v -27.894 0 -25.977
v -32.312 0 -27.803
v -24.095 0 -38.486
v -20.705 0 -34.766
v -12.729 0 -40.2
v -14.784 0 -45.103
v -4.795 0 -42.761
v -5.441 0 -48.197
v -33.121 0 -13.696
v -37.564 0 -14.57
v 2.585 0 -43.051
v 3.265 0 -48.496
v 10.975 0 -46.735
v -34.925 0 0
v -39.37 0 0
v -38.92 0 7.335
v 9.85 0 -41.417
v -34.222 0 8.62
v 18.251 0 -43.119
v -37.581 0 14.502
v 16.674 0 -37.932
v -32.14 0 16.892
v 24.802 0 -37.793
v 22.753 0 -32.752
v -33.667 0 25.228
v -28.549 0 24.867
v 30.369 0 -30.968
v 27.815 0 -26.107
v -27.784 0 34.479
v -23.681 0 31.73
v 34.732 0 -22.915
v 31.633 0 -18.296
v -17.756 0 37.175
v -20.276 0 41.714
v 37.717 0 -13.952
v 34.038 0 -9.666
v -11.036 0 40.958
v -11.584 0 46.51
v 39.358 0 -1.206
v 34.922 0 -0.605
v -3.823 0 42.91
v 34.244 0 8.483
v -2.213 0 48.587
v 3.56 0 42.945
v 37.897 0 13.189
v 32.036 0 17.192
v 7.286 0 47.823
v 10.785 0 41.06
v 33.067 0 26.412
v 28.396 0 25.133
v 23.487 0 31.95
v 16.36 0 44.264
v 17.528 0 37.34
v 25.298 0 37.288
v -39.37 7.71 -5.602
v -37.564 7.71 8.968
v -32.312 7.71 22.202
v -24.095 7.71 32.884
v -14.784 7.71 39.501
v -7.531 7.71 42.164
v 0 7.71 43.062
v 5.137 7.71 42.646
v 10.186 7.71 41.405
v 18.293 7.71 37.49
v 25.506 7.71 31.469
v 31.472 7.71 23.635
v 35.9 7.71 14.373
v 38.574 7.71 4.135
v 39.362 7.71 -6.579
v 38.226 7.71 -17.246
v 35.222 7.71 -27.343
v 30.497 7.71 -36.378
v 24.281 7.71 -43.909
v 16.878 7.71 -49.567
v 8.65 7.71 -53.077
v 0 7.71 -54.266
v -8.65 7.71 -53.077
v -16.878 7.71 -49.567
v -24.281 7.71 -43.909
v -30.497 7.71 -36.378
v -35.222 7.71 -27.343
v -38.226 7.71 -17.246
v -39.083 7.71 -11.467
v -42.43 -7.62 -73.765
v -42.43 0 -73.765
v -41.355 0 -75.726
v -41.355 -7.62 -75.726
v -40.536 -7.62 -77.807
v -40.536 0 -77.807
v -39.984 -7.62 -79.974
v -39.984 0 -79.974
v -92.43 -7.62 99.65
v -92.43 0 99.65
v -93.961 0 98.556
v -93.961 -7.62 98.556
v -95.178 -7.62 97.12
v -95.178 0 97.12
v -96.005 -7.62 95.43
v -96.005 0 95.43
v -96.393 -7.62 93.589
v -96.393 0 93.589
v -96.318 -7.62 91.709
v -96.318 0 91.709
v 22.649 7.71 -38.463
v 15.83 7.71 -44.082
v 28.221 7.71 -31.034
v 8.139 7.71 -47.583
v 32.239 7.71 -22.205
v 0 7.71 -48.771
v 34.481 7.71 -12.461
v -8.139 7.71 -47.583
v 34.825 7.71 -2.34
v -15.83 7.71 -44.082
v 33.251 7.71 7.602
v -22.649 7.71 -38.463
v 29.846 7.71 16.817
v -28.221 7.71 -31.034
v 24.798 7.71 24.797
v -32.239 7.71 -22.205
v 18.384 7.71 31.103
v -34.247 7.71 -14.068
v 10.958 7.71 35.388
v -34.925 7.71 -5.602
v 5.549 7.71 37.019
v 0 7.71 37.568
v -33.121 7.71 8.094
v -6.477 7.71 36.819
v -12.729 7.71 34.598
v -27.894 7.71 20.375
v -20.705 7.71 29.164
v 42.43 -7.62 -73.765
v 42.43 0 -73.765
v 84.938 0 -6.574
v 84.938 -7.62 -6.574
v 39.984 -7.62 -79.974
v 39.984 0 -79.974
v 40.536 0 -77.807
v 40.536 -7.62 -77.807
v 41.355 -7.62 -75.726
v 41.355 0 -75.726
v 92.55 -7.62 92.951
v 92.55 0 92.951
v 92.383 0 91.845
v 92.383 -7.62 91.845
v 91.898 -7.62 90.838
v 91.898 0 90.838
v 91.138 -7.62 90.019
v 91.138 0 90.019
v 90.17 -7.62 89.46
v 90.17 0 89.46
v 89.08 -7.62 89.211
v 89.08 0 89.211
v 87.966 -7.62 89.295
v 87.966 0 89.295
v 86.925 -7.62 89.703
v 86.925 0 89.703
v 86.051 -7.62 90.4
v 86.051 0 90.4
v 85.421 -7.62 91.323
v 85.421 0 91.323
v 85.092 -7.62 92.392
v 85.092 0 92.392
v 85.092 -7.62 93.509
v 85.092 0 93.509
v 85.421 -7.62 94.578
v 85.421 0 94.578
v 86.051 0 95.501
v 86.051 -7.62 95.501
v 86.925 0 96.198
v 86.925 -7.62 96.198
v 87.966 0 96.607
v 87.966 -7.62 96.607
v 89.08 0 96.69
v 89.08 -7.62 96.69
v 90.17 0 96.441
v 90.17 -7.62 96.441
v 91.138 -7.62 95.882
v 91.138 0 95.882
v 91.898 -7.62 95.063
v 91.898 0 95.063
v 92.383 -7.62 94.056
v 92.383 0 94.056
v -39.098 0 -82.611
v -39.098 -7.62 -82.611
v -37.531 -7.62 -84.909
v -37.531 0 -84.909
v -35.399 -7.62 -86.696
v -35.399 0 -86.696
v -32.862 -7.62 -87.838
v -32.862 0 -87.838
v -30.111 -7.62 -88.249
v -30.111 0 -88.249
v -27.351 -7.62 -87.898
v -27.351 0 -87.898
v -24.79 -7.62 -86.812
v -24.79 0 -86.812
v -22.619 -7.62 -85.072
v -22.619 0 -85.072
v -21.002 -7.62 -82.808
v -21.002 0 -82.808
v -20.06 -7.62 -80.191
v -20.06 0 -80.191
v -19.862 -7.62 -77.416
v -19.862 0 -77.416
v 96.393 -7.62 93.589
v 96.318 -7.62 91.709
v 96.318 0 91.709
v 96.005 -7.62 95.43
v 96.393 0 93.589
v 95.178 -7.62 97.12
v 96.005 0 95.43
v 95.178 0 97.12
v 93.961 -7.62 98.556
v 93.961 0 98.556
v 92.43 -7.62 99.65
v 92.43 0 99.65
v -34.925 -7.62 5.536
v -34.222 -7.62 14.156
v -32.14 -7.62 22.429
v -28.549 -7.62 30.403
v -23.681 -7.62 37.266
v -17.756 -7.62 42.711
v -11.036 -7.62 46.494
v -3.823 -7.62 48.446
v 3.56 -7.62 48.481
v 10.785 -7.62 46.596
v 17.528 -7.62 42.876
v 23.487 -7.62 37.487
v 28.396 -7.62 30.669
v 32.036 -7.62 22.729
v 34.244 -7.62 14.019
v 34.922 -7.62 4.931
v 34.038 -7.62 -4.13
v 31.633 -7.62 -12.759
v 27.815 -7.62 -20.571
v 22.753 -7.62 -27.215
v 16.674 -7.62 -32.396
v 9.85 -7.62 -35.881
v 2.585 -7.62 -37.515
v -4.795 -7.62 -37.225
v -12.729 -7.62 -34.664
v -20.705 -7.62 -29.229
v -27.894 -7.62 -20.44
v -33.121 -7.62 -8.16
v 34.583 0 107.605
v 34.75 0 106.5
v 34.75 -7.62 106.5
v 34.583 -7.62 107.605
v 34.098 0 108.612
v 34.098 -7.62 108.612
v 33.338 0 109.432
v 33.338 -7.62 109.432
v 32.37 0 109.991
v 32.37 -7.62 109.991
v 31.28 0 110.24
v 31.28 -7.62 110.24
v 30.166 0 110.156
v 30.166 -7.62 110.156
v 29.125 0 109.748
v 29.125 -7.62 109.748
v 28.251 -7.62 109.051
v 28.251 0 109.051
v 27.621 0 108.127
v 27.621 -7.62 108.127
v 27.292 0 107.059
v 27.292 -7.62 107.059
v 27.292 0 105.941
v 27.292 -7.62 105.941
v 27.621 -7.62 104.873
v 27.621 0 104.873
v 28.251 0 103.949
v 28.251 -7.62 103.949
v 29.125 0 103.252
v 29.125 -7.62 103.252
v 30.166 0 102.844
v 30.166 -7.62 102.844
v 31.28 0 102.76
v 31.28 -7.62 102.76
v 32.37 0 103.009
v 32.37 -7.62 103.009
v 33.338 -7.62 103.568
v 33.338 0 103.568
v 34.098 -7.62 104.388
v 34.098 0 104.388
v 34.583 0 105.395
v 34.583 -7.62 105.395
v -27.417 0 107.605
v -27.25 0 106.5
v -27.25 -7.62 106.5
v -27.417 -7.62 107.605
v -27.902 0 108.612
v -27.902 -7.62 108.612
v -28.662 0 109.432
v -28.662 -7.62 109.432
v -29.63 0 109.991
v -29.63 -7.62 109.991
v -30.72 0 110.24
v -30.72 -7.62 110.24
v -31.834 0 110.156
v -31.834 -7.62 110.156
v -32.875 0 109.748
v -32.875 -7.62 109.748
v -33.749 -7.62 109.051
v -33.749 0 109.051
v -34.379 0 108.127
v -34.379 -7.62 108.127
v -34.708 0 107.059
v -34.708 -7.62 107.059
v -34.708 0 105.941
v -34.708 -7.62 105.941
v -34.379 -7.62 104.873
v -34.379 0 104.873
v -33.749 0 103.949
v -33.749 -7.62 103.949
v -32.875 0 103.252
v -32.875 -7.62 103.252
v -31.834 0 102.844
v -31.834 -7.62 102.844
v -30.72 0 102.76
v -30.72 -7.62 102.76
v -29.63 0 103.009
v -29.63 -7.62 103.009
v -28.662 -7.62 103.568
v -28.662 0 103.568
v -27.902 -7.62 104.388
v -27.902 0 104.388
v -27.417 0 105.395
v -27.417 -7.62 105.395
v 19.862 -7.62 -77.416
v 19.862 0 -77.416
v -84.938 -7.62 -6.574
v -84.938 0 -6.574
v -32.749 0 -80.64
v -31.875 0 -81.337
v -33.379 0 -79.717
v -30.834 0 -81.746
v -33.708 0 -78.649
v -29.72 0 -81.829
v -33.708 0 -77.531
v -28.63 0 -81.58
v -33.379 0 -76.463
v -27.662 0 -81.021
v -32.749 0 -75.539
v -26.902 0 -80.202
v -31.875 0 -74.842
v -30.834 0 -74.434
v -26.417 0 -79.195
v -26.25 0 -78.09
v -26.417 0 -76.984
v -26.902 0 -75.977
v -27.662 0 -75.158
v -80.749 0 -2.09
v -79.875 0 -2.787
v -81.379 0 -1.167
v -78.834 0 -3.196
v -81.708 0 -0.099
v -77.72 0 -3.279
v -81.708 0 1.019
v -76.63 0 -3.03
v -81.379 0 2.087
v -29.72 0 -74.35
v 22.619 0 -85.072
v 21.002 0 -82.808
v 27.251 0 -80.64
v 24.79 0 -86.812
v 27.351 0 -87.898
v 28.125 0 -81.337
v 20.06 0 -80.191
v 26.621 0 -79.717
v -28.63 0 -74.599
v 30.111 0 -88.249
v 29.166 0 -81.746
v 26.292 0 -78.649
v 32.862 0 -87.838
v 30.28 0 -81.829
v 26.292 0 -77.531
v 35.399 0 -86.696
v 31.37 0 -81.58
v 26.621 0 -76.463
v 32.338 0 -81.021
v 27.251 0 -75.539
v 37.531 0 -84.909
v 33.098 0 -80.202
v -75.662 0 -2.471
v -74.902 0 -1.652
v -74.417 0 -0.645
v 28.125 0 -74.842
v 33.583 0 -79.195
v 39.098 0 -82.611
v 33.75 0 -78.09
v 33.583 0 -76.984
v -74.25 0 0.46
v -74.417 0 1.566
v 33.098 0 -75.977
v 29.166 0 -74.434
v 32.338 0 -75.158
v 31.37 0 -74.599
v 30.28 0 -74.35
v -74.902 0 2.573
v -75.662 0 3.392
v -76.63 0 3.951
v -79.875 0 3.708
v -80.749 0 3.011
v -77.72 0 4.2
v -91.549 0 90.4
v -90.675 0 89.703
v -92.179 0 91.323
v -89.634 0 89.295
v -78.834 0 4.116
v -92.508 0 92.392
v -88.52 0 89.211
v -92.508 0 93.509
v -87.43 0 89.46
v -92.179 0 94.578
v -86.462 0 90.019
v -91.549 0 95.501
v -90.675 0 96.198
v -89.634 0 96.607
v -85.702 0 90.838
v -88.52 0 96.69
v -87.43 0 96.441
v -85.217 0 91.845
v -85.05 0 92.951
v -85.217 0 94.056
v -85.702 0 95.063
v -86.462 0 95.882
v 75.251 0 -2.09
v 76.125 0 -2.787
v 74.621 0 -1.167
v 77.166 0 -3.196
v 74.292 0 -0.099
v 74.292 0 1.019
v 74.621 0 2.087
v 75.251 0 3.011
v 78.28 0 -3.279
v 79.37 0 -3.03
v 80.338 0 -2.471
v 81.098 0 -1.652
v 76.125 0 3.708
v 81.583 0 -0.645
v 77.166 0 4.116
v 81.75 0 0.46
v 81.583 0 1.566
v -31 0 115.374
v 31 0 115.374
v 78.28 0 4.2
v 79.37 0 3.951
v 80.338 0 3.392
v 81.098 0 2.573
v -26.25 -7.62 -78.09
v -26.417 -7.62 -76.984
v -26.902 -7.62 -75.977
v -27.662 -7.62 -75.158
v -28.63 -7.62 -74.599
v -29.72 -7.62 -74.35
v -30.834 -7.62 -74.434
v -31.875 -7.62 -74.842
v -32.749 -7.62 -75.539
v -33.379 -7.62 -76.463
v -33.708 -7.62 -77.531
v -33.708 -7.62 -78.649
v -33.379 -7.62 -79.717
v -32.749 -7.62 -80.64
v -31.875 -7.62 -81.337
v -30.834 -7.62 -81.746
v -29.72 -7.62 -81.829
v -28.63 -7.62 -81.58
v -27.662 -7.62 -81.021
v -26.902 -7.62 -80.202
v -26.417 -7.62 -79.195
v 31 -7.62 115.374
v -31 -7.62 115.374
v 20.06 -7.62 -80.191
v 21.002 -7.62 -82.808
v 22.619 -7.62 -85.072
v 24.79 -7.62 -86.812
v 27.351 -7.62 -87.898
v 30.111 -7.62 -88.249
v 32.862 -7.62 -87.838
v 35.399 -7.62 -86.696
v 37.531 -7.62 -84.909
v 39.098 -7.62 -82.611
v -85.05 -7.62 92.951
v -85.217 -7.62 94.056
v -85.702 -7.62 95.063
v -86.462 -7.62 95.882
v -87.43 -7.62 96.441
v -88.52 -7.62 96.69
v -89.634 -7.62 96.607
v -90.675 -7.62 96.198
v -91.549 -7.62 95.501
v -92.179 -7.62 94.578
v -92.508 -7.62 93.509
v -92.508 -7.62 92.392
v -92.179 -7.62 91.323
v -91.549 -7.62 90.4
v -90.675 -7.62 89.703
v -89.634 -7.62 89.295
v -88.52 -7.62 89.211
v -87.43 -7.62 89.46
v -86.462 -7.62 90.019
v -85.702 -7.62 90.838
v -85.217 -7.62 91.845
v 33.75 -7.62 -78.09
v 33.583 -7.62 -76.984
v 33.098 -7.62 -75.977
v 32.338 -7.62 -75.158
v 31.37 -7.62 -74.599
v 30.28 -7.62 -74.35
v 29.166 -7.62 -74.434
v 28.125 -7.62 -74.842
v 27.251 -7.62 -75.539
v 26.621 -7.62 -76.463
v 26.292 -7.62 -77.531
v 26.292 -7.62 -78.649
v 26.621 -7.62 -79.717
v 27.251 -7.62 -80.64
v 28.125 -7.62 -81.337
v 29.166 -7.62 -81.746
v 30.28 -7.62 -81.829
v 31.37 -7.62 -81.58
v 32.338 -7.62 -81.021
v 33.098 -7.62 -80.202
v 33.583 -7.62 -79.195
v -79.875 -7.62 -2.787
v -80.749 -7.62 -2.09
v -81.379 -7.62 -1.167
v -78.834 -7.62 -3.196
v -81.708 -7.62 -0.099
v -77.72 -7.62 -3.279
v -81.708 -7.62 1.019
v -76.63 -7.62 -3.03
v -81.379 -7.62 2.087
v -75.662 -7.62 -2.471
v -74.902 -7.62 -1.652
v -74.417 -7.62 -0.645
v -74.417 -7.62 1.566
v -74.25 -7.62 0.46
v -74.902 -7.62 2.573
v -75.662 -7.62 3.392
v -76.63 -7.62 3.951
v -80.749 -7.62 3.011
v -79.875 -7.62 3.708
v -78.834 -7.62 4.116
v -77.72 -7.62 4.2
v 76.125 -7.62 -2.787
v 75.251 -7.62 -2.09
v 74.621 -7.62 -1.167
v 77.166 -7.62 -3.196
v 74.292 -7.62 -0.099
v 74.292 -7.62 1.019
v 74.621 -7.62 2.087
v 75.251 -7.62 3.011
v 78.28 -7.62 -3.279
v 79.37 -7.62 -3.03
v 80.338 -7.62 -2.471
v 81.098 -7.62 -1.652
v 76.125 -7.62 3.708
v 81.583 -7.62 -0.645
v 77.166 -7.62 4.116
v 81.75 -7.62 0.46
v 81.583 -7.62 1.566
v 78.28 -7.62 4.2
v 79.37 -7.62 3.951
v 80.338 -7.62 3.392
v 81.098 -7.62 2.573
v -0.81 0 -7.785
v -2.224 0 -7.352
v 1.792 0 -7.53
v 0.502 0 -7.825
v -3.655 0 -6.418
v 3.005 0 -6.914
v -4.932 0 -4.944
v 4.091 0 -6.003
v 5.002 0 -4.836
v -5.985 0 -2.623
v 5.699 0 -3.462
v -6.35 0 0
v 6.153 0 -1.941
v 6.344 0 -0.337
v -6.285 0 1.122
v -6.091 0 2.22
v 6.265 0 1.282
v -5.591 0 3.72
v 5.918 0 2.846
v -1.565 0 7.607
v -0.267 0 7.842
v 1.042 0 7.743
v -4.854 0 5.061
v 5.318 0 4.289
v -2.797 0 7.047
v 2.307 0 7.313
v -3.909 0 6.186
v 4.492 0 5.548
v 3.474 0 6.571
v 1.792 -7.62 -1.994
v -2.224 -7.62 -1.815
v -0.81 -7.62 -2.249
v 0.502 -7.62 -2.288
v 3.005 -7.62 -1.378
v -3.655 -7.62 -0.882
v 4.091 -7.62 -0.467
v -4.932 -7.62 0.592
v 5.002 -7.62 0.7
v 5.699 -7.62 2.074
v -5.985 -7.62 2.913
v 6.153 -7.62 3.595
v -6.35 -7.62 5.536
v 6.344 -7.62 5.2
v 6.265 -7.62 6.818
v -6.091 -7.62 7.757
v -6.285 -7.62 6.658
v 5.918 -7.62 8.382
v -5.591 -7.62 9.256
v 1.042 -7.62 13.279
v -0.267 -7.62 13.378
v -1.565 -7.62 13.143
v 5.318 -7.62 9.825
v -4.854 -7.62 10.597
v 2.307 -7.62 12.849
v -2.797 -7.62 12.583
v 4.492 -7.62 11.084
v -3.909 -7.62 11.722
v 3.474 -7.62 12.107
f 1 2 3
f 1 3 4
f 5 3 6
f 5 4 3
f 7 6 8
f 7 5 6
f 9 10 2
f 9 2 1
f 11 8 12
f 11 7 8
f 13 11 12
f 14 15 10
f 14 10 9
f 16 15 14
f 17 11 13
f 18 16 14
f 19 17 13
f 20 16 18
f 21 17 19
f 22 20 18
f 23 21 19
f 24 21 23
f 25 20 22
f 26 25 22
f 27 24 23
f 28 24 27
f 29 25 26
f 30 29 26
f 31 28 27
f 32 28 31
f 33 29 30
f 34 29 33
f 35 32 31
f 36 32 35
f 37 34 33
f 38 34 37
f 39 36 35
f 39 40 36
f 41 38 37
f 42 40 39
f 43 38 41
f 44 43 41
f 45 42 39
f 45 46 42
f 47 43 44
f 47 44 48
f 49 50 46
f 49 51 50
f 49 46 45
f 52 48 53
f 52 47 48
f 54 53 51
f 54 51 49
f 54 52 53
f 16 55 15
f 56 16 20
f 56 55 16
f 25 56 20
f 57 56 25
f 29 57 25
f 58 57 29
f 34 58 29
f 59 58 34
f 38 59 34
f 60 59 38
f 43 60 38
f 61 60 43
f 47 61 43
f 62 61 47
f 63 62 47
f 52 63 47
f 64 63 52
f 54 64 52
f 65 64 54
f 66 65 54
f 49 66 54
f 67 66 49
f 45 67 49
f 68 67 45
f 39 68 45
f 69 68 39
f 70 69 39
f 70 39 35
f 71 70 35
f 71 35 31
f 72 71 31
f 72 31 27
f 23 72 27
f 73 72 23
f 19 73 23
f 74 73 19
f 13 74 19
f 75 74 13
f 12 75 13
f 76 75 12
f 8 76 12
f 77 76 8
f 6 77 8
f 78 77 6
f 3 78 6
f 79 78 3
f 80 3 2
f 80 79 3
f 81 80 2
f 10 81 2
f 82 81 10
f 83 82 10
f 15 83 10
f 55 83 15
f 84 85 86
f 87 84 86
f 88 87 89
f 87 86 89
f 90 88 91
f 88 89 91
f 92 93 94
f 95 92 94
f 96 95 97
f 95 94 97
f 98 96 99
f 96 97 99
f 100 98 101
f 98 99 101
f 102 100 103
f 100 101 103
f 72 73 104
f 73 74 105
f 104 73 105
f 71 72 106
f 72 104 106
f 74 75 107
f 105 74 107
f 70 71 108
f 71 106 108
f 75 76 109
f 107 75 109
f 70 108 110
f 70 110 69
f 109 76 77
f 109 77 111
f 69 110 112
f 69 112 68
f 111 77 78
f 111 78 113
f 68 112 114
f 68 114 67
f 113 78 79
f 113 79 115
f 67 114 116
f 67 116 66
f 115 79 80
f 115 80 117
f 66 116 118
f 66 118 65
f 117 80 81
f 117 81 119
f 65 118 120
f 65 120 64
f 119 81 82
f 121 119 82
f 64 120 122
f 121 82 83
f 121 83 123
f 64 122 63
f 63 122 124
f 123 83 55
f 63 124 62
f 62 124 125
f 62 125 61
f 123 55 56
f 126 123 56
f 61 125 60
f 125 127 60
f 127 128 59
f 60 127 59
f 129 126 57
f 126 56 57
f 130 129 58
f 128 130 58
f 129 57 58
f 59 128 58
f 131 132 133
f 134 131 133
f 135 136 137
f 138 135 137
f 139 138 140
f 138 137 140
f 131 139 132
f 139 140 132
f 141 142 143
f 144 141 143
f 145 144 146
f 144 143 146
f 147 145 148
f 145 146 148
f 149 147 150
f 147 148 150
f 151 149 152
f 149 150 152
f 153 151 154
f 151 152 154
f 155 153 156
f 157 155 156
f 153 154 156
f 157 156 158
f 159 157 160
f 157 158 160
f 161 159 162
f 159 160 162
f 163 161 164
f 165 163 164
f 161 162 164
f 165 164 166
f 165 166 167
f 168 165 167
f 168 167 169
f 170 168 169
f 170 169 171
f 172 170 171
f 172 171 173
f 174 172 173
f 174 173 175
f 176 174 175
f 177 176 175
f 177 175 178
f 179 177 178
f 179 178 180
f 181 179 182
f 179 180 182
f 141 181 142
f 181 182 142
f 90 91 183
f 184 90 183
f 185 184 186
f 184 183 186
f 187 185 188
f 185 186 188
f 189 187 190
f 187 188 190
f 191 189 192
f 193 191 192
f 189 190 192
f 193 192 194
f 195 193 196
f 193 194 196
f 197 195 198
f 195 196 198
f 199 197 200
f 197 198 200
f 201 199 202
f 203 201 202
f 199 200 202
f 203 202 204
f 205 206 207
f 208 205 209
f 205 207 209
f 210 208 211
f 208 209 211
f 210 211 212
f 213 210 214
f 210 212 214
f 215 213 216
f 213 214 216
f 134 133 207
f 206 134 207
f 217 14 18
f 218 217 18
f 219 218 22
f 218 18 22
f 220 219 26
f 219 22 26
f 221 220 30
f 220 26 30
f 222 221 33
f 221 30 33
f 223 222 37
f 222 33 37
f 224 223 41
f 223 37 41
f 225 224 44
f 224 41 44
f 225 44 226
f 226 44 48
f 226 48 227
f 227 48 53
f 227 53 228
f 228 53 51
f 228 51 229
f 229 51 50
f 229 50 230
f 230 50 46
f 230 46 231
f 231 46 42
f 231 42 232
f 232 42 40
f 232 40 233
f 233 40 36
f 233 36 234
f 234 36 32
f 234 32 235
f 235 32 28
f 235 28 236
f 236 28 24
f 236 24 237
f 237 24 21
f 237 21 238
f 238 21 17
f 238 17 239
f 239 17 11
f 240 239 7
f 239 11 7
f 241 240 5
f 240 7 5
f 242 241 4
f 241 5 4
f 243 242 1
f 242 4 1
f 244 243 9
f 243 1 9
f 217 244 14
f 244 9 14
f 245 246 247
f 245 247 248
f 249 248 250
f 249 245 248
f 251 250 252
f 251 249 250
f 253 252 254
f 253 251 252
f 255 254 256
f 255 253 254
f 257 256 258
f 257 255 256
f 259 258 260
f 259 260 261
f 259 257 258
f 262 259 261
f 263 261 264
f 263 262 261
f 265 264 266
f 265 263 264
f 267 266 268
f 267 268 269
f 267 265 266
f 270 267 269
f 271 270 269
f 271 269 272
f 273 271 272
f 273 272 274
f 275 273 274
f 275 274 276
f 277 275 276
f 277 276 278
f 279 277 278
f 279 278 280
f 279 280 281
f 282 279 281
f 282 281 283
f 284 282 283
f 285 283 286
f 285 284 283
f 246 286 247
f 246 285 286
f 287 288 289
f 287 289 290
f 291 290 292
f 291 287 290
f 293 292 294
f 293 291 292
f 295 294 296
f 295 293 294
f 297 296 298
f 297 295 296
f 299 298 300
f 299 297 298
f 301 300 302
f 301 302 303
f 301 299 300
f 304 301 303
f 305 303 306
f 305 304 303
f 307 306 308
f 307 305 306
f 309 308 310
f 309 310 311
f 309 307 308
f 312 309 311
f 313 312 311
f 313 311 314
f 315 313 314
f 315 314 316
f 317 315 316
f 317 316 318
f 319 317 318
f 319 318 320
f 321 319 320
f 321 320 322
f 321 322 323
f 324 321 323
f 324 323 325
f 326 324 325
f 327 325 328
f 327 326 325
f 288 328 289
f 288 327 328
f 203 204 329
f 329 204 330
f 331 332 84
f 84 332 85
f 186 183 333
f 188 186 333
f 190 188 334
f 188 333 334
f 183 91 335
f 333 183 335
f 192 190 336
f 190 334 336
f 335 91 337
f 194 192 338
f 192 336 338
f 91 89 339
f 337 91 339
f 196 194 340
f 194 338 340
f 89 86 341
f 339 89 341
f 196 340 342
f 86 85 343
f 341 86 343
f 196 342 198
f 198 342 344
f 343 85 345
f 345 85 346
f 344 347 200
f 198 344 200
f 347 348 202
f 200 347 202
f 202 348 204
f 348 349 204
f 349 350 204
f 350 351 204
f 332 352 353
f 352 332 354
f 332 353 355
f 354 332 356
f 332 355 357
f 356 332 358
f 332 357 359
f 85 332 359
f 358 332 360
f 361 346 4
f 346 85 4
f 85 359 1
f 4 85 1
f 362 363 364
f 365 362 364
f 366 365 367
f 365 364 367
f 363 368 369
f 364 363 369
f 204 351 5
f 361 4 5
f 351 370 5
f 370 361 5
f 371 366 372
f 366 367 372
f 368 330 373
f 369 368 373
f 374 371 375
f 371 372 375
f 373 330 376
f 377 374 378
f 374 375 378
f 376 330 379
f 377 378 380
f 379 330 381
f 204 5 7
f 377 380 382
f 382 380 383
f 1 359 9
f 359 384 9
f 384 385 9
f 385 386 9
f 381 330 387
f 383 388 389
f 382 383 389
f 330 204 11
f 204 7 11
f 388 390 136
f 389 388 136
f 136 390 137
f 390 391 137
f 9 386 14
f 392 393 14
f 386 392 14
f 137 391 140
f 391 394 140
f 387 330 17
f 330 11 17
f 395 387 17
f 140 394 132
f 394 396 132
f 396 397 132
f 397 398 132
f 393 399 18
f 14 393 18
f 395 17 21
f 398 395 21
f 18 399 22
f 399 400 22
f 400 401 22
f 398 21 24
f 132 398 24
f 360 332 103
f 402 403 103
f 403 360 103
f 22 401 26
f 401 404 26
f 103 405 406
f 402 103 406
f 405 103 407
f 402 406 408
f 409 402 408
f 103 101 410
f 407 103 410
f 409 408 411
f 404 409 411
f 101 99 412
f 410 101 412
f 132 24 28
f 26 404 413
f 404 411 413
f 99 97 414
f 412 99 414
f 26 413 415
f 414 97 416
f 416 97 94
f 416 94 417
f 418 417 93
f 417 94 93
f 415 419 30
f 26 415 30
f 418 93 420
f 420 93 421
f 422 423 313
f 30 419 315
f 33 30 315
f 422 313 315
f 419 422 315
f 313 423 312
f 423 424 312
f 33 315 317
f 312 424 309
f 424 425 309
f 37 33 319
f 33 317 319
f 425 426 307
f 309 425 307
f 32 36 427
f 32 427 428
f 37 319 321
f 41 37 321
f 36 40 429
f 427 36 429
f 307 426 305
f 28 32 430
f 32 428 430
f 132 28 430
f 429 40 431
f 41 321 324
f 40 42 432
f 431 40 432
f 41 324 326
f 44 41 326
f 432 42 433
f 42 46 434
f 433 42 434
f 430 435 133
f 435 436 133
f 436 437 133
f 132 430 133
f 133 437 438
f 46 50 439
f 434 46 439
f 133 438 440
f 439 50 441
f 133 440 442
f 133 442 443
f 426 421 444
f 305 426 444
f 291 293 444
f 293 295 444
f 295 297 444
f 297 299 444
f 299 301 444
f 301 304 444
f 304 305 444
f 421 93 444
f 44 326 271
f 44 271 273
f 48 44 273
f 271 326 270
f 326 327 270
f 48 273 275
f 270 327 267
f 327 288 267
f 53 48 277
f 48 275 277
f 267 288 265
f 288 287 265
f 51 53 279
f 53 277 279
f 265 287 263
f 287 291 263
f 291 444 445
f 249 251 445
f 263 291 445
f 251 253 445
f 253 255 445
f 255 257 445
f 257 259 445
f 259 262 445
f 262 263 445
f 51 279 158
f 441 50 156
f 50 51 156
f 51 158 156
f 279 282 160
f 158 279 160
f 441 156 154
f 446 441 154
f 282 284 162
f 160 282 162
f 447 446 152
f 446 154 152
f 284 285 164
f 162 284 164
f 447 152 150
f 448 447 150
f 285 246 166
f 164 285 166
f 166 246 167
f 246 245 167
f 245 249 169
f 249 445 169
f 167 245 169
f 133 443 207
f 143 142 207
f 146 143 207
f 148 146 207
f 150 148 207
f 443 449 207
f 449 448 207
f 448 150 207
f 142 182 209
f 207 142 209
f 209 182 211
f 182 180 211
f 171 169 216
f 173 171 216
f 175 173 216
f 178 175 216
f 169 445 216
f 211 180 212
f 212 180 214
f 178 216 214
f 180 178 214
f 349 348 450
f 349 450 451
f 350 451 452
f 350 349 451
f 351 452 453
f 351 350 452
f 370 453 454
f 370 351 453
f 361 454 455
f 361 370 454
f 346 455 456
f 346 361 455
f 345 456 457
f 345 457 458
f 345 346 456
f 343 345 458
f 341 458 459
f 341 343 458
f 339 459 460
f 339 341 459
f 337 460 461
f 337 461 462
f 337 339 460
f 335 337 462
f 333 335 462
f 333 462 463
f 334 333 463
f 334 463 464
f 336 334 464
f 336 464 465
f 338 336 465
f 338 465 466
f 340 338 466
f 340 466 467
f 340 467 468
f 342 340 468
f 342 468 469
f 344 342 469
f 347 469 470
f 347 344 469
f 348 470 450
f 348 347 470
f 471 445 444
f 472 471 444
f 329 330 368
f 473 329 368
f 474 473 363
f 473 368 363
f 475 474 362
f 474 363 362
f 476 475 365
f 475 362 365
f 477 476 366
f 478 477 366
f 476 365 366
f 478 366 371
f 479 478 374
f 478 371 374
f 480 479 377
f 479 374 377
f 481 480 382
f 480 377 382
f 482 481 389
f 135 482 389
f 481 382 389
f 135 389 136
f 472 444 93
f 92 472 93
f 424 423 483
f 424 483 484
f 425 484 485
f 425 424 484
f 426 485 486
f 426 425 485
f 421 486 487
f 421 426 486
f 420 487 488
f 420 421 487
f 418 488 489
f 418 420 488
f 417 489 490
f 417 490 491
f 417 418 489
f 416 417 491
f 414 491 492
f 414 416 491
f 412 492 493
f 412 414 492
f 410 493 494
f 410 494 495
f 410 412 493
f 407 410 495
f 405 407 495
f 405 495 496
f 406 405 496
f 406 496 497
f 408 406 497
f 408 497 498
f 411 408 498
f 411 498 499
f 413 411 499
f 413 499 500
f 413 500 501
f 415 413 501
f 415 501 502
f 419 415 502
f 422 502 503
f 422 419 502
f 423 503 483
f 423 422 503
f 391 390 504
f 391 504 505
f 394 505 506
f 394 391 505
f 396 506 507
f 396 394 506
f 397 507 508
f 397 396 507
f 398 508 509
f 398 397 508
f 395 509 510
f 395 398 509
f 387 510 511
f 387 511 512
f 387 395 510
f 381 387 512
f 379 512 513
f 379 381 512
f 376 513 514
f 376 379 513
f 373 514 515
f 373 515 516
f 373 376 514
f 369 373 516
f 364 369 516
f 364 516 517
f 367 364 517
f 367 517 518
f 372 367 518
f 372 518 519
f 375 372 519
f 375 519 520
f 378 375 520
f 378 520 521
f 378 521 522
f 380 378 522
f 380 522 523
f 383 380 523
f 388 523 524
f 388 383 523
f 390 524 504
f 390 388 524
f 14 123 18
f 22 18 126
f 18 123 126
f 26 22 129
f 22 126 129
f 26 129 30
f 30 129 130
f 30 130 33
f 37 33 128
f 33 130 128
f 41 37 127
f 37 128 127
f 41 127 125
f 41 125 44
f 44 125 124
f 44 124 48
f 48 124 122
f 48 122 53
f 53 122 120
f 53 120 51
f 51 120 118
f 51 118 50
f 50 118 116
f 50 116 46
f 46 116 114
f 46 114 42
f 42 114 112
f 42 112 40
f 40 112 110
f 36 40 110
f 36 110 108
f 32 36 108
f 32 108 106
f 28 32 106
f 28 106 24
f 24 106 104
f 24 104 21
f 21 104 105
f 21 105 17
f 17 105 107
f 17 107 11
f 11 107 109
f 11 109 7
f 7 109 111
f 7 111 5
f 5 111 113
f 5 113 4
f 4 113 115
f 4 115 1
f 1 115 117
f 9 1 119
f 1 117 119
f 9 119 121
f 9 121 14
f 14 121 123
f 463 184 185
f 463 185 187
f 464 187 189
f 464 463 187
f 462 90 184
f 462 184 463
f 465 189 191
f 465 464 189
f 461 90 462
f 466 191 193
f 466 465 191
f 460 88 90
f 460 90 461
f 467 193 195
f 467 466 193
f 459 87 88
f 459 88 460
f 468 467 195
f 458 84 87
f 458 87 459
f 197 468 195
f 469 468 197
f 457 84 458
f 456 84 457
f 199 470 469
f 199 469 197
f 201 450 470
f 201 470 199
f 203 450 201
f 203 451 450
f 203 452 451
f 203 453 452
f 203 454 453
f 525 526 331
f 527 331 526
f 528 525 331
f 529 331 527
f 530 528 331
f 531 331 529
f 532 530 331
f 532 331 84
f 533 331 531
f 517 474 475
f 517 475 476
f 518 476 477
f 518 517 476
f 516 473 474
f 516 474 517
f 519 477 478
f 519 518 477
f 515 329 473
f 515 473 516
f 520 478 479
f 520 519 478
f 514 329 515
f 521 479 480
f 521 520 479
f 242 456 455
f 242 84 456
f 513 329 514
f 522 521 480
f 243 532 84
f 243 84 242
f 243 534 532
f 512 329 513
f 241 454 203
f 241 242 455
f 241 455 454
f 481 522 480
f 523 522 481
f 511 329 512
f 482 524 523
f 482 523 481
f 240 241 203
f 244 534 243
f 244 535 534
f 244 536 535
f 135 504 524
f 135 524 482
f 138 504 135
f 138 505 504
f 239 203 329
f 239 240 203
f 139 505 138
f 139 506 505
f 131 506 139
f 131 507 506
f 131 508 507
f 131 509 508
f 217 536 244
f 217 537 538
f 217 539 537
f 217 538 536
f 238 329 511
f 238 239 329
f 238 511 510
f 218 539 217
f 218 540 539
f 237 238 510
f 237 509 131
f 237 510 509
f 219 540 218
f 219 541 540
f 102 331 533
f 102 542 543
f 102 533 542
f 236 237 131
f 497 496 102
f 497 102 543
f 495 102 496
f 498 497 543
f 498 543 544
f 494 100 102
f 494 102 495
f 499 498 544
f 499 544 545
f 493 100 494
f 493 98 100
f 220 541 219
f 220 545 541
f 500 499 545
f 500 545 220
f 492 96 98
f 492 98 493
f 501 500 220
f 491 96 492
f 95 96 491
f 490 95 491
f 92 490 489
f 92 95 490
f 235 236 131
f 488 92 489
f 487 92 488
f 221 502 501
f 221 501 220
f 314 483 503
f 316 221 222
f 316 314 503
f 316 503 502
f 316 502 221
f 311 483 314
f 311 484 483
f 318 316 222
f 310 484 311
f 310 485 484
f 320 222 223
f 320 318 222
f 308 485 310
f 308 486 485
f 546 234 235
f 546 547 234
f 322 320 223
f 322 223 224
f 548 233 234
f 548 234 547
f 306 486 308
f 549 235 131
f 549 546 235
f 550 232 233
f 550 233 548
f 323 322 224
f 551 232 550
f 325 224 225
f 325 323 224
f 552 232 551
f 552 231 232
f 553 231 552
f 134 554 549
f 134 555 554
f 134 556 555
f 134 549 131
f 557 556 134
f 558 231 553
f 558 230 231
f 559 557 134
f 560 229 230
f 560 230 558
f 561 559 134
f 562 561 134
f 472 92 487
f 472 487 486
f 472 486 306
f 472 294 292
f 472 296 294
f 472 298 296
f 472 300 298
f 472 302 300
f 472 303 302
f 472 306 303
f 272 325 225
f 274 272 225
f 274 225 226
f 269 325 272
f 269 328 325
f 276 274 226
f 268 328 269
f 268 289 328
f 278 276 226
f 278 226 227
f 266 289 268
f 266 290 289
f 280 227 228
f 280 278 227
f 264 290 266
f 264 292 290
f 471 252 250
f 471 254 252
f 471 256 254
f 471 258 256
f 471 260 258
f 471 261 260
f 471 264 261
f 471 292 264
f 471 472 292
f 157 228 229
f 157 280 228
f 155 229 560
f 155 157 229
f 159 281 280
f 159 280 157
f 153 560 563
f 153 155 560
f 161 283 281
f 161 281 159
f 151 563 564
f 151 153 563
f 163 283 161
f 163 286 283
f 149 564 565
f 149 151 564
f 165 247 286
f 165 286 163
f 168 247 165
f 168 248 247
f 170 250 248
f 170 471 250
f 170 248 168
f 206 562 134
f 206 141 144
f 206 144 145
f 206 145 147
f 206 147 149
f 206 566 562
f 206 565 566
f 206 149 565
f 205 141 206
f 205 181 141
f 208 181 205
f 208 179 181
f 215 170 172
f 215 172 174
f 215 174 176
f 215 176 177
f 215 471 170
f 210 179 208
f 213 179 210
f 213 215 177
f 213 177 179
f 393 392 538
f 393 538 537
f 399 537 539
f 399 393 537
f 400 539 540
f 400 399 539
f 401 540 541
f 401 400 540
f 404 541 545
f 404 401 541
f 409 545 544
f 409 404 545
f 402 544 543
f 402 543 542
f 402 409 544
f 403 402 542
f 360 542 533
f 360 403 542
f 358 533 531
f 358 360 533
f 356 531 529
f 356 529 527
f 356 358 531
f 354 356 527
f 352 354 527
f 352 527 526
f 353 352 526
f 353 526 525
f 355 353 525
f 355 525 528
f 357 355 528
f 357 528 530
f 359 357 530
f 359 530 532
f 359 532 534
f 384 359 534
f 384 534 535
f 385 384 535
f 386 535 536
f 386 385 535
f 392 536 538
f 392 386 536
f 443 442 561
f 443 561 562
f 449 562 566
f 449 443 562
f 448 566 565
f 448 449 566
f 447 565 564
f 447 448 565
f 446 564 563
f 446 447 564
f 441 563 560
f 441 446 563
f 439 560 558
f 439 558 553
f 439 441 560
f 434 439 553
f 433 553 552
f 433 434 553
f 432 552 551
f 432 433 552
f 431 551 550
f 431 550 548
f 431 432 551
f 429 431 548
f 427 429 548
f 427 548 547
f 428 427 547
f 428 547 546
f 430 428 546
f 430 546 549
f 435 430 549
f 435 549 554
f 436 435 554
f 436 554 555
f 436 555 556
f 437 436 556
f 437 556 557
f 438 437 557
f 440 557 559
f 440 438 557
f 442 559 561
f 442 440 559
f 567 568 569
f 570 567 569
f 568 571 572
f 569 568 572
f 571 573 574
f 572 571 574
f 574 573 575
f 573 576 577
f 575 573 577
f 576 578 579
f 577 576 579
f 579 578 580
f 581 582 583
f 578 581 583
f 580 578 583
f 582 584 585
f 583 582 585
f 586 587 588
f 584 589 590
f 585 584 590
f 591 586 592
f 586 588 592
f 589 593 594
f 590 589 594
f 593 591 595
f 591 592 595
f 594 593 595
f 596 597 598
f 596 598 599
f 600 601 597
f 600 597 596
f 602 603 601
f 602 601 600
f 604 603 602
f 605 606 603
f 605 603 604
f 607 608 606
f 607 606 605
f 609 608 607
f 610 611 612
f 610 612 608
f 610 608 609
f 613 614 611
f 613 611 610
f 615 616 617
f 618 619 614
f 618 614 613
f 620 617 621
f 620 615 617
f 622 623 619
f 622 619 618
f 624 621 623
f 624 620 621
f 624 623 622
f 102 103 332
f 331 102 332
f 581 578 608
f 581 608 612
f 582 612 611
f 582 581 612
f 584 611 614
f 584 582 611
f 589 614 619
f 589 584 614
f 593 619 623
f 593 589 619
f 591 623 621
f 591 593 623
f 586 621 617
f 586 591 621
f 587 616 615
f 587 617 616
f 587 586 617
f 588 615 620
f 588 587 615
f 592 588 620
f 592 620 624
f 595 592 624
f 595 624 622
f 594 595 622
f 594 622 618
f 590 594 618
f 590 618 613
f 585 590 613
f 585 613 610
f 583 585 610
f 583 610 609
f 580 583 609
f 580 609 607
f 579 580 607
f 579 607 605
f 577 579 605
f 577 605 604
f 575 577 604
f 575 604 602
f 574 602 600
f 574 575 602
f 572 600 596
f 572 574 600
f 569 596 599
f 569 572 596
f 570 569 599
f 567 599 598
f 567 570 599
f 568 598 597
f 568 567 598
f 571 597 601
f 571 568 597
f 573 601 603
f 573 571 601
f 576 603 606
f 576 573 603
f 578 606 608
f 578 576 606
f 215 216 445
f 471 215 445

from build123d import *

# Parameters (mm, degrees)
F0_R          = 3.75
F1_DEPTH      = 7.62
F3_R          = 39.37
F3_R_2        = 34.925
F5_R          = 34.925
F5_R_2        = 6.35
F6_DEPTH      = 119.4844861947
F7_W          = 63.9946283773
F7_H          = 122.9776404798
F8_DEPTH      = 50.8
F8_DEPTH_BACK = 50.8


with BuildPart() as f1:
    # F0 (on Front) → F1 (new body)
    with BuildSketch(Plane.XZ):
        with BuildLine():
            Line((-19.8623637505, -77.4158512519), (19.8623637505, -77.4158512519))
            ThreePointArc((19.8623637505, -77.4158512519), (28.7187046808, -88.1684784598), (39.9837521989, -79.9738173344))
            ThreePointArc((39.9837521989, -79.9738173344), (40.9128966099, -76.7537922701), (42.4297843084, -73.7653273698))
            Line((42.4297843084, -73.7653273698), (84.9381992292, -6.5740980437))
            Line((84.9381992292, -6.5740980437), (96.3180937264, 91.7085113337))
            ThreePointArc((96.3180937264, 91.7085113337), (95.6439196557, 96.3009502366), (92.4302844288, 99.6502120034))
            Line((92.4302844288, 99.6502120034), (31, 115.3735667467))
            Line((31, 115.3735667467), (-31, 115.3735667467))
            Line((-31, 115.3735667467), (-92.4302844288, 99.6502120034))
            ThreePointArc((-92.4302844288, 99.6502120034), (-95.6439196557, 96.3009502366), (-96.3180937264, 91.7085113337))
            Line((-96.3180937264, 91.7085113337), (-84.9381992292, -6.5740980437))
            Line((-84.9381992292, -6.5740980437), (-42.4297843084, -73.7653273698))
            ThreePointArc((-42.4297843084, -73.7653273698), (-40.9128966099, -76.7537922701), (-39.9837521989, -79.9738173344))
            ThreePointArc((-39.9837521989, -79.9738173344), (-28.7187046808, -88.1684784598), (-19.8623637505, -77.4158512519))
        make_face()
        with Locations((-30, -78.0895954708)):
            Circle(F0_R, mode=Mode.SUBTRACT)
        with Locations((-78, 0.4604045292)):
            Circle(F0_R, mode=Mode.SUBTRACT)
        with Locations((30, -78.0895954708)):
            Circle(F0_R, mode=Mode.SUBTRACT)
        with Locations((78, 0.4604045292)):
            Circle(F0_R, mode=Mode.SUBTRACT)
        with Locations((-88.8, 92.9505526862)):
            Circle(F0_R, mode=Mode.SUBTRACT)
        with Locations((-31, 106.5)):
            Circle(F0_R, mode=Mode.SUBTRACT)
        with Locations((31, 106.5)):
            Circle(F0_R, mode=Mode.SUBTRACT)
        with BuildLine():
            ThreePointArc((85.05, 92.9505526862), (88.8, 96.7005526862), (92.55, 92.9505526862))
            ThreePointArc((92.55, 92.9505526862), (88.8, 89.2005526862), (85.05, 92.9505526862))
        make_face(mode=Mode.SUBTRACT)
    extrude(amount=F1_DEPTH)


with BuildPart() as f4:
    # F3 (on face) → F4 (new body, up to the next surface of F1)
    with BuildSketch(Plane(origin=(0, 36.8134248988, -26.7465187905), x_dir=(-1, 0, 0), z_dir=(0, 0.8090169944, -0.5877852523))):
        Circle(F3_R)
        Circle(F3_R_2, mode=Mode.SUBTRACT)
    extrude(until=Until.NEXT, target=f1.part, dir=(0, -0.8090169944, 0.5877852523))

    # F7 (on Right) → F8 (cut, two sides)
    with BuildSketch(Plane.YZ) as f8_sk:
        with Locations((39.7075130604, -16.8563146144)):
            Rectangle(F7_W, F7_H)
    extrude(amount=-F8_DEPTH, mode=Mode.SUBTRACT)
    extrude(f8_sk.sketch, amount=F8_DEPTH_BACK, mode=Mode.SUBTRACT)


with BuildPart() as f1_1:
    add(f1.part)

    # F5 (on face) → F6 (cut, through all)
    with BuildSketch(Plane(origin=(0, 36.8134248988, -26.7465187905), x_dir=(-1, 0, 0), z_dir=(0, 0.8090169944, -0.5877852523))):
        Circle(F5_R)
        Circle(F5_R_2, mode=Mode.SUBTRACT)
    extrude(amount=-F6_DEPTH, mode=Mode.SUBTRACT)


solid = Compound([f4.part, f1_1.part])
